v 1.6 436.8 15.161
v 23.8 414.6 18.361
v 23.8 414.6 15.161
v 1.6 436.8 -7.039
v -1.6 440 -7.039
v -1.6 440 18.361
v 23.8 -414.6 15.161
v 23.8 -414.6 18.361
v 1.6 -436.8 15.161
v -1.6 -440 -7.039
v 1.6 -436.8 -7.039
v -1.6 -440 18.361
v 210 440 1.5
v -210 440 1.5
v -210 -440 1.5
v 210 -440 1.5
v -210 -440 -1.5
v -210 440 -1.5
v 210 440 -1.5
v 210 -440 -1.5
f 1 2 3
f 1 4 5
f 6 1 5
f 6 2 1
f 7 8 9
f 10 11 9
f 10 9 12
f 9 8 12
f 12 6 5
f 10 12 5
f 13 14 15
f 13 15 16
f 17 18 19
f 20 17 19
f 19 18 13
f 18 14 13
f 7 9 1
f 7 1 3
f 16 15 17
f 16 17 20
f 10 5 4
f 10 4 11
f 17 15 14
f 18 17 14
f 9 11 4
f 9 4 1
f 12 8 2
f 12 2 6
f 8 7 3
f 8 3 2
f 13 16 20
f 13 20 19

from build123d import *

# Parameters (mm, degrees)
F1_DEPTH = 440
F3_DEPTH = 25.4
F4_W     = 420
F4_H     = 880
F5_DEPTH = 1.5


# Not quite as in the source:
# - a pattern or mirror of a feature is missing from the dataset's text; its kind, count and spacing are read off the source's solid


with BuildPart() as f1:
    # F0 (on Front) → F1 (new body, symmetric)
    with BuildSketch(Plane.XZ):
        Polygon((1.6, -7.0391468048), (1.6, 15.1606531952), (23.7998, 15.1606531952), (23.7998, 18.3608531952), (-1.6002, 18.3608531952), (-1.6002, -7.0391468048), align=None)
    extrude(amount=F1_DEPTH, both=True)

    # F2 (on face) → F3 (cut)
    with BuildSketch(Plane.XY.offset(18.3608531952)):
        Polygon((23.7998, -414.6), (-1.6002, -440), (23.7998, -440), align=None)
    f3 = extrude(amount=-F3_DEPTH, mode=Mode.SUBTRACT)

    # F3_copies: F3 across plane
    add(f3.mirror(Plane.ZX), mode=Mode.SUBTRACT)


with BuildPart() as f5:
    # F4 (on Top) → F5 (new body, symmetric)
    with BuildSketch(Plane.XY):
        Rectangle(F4_W, F4_H)
    extrude(amount=F5_DEPTH, both=True)


solid = Compound([f1.part, f5.part])
